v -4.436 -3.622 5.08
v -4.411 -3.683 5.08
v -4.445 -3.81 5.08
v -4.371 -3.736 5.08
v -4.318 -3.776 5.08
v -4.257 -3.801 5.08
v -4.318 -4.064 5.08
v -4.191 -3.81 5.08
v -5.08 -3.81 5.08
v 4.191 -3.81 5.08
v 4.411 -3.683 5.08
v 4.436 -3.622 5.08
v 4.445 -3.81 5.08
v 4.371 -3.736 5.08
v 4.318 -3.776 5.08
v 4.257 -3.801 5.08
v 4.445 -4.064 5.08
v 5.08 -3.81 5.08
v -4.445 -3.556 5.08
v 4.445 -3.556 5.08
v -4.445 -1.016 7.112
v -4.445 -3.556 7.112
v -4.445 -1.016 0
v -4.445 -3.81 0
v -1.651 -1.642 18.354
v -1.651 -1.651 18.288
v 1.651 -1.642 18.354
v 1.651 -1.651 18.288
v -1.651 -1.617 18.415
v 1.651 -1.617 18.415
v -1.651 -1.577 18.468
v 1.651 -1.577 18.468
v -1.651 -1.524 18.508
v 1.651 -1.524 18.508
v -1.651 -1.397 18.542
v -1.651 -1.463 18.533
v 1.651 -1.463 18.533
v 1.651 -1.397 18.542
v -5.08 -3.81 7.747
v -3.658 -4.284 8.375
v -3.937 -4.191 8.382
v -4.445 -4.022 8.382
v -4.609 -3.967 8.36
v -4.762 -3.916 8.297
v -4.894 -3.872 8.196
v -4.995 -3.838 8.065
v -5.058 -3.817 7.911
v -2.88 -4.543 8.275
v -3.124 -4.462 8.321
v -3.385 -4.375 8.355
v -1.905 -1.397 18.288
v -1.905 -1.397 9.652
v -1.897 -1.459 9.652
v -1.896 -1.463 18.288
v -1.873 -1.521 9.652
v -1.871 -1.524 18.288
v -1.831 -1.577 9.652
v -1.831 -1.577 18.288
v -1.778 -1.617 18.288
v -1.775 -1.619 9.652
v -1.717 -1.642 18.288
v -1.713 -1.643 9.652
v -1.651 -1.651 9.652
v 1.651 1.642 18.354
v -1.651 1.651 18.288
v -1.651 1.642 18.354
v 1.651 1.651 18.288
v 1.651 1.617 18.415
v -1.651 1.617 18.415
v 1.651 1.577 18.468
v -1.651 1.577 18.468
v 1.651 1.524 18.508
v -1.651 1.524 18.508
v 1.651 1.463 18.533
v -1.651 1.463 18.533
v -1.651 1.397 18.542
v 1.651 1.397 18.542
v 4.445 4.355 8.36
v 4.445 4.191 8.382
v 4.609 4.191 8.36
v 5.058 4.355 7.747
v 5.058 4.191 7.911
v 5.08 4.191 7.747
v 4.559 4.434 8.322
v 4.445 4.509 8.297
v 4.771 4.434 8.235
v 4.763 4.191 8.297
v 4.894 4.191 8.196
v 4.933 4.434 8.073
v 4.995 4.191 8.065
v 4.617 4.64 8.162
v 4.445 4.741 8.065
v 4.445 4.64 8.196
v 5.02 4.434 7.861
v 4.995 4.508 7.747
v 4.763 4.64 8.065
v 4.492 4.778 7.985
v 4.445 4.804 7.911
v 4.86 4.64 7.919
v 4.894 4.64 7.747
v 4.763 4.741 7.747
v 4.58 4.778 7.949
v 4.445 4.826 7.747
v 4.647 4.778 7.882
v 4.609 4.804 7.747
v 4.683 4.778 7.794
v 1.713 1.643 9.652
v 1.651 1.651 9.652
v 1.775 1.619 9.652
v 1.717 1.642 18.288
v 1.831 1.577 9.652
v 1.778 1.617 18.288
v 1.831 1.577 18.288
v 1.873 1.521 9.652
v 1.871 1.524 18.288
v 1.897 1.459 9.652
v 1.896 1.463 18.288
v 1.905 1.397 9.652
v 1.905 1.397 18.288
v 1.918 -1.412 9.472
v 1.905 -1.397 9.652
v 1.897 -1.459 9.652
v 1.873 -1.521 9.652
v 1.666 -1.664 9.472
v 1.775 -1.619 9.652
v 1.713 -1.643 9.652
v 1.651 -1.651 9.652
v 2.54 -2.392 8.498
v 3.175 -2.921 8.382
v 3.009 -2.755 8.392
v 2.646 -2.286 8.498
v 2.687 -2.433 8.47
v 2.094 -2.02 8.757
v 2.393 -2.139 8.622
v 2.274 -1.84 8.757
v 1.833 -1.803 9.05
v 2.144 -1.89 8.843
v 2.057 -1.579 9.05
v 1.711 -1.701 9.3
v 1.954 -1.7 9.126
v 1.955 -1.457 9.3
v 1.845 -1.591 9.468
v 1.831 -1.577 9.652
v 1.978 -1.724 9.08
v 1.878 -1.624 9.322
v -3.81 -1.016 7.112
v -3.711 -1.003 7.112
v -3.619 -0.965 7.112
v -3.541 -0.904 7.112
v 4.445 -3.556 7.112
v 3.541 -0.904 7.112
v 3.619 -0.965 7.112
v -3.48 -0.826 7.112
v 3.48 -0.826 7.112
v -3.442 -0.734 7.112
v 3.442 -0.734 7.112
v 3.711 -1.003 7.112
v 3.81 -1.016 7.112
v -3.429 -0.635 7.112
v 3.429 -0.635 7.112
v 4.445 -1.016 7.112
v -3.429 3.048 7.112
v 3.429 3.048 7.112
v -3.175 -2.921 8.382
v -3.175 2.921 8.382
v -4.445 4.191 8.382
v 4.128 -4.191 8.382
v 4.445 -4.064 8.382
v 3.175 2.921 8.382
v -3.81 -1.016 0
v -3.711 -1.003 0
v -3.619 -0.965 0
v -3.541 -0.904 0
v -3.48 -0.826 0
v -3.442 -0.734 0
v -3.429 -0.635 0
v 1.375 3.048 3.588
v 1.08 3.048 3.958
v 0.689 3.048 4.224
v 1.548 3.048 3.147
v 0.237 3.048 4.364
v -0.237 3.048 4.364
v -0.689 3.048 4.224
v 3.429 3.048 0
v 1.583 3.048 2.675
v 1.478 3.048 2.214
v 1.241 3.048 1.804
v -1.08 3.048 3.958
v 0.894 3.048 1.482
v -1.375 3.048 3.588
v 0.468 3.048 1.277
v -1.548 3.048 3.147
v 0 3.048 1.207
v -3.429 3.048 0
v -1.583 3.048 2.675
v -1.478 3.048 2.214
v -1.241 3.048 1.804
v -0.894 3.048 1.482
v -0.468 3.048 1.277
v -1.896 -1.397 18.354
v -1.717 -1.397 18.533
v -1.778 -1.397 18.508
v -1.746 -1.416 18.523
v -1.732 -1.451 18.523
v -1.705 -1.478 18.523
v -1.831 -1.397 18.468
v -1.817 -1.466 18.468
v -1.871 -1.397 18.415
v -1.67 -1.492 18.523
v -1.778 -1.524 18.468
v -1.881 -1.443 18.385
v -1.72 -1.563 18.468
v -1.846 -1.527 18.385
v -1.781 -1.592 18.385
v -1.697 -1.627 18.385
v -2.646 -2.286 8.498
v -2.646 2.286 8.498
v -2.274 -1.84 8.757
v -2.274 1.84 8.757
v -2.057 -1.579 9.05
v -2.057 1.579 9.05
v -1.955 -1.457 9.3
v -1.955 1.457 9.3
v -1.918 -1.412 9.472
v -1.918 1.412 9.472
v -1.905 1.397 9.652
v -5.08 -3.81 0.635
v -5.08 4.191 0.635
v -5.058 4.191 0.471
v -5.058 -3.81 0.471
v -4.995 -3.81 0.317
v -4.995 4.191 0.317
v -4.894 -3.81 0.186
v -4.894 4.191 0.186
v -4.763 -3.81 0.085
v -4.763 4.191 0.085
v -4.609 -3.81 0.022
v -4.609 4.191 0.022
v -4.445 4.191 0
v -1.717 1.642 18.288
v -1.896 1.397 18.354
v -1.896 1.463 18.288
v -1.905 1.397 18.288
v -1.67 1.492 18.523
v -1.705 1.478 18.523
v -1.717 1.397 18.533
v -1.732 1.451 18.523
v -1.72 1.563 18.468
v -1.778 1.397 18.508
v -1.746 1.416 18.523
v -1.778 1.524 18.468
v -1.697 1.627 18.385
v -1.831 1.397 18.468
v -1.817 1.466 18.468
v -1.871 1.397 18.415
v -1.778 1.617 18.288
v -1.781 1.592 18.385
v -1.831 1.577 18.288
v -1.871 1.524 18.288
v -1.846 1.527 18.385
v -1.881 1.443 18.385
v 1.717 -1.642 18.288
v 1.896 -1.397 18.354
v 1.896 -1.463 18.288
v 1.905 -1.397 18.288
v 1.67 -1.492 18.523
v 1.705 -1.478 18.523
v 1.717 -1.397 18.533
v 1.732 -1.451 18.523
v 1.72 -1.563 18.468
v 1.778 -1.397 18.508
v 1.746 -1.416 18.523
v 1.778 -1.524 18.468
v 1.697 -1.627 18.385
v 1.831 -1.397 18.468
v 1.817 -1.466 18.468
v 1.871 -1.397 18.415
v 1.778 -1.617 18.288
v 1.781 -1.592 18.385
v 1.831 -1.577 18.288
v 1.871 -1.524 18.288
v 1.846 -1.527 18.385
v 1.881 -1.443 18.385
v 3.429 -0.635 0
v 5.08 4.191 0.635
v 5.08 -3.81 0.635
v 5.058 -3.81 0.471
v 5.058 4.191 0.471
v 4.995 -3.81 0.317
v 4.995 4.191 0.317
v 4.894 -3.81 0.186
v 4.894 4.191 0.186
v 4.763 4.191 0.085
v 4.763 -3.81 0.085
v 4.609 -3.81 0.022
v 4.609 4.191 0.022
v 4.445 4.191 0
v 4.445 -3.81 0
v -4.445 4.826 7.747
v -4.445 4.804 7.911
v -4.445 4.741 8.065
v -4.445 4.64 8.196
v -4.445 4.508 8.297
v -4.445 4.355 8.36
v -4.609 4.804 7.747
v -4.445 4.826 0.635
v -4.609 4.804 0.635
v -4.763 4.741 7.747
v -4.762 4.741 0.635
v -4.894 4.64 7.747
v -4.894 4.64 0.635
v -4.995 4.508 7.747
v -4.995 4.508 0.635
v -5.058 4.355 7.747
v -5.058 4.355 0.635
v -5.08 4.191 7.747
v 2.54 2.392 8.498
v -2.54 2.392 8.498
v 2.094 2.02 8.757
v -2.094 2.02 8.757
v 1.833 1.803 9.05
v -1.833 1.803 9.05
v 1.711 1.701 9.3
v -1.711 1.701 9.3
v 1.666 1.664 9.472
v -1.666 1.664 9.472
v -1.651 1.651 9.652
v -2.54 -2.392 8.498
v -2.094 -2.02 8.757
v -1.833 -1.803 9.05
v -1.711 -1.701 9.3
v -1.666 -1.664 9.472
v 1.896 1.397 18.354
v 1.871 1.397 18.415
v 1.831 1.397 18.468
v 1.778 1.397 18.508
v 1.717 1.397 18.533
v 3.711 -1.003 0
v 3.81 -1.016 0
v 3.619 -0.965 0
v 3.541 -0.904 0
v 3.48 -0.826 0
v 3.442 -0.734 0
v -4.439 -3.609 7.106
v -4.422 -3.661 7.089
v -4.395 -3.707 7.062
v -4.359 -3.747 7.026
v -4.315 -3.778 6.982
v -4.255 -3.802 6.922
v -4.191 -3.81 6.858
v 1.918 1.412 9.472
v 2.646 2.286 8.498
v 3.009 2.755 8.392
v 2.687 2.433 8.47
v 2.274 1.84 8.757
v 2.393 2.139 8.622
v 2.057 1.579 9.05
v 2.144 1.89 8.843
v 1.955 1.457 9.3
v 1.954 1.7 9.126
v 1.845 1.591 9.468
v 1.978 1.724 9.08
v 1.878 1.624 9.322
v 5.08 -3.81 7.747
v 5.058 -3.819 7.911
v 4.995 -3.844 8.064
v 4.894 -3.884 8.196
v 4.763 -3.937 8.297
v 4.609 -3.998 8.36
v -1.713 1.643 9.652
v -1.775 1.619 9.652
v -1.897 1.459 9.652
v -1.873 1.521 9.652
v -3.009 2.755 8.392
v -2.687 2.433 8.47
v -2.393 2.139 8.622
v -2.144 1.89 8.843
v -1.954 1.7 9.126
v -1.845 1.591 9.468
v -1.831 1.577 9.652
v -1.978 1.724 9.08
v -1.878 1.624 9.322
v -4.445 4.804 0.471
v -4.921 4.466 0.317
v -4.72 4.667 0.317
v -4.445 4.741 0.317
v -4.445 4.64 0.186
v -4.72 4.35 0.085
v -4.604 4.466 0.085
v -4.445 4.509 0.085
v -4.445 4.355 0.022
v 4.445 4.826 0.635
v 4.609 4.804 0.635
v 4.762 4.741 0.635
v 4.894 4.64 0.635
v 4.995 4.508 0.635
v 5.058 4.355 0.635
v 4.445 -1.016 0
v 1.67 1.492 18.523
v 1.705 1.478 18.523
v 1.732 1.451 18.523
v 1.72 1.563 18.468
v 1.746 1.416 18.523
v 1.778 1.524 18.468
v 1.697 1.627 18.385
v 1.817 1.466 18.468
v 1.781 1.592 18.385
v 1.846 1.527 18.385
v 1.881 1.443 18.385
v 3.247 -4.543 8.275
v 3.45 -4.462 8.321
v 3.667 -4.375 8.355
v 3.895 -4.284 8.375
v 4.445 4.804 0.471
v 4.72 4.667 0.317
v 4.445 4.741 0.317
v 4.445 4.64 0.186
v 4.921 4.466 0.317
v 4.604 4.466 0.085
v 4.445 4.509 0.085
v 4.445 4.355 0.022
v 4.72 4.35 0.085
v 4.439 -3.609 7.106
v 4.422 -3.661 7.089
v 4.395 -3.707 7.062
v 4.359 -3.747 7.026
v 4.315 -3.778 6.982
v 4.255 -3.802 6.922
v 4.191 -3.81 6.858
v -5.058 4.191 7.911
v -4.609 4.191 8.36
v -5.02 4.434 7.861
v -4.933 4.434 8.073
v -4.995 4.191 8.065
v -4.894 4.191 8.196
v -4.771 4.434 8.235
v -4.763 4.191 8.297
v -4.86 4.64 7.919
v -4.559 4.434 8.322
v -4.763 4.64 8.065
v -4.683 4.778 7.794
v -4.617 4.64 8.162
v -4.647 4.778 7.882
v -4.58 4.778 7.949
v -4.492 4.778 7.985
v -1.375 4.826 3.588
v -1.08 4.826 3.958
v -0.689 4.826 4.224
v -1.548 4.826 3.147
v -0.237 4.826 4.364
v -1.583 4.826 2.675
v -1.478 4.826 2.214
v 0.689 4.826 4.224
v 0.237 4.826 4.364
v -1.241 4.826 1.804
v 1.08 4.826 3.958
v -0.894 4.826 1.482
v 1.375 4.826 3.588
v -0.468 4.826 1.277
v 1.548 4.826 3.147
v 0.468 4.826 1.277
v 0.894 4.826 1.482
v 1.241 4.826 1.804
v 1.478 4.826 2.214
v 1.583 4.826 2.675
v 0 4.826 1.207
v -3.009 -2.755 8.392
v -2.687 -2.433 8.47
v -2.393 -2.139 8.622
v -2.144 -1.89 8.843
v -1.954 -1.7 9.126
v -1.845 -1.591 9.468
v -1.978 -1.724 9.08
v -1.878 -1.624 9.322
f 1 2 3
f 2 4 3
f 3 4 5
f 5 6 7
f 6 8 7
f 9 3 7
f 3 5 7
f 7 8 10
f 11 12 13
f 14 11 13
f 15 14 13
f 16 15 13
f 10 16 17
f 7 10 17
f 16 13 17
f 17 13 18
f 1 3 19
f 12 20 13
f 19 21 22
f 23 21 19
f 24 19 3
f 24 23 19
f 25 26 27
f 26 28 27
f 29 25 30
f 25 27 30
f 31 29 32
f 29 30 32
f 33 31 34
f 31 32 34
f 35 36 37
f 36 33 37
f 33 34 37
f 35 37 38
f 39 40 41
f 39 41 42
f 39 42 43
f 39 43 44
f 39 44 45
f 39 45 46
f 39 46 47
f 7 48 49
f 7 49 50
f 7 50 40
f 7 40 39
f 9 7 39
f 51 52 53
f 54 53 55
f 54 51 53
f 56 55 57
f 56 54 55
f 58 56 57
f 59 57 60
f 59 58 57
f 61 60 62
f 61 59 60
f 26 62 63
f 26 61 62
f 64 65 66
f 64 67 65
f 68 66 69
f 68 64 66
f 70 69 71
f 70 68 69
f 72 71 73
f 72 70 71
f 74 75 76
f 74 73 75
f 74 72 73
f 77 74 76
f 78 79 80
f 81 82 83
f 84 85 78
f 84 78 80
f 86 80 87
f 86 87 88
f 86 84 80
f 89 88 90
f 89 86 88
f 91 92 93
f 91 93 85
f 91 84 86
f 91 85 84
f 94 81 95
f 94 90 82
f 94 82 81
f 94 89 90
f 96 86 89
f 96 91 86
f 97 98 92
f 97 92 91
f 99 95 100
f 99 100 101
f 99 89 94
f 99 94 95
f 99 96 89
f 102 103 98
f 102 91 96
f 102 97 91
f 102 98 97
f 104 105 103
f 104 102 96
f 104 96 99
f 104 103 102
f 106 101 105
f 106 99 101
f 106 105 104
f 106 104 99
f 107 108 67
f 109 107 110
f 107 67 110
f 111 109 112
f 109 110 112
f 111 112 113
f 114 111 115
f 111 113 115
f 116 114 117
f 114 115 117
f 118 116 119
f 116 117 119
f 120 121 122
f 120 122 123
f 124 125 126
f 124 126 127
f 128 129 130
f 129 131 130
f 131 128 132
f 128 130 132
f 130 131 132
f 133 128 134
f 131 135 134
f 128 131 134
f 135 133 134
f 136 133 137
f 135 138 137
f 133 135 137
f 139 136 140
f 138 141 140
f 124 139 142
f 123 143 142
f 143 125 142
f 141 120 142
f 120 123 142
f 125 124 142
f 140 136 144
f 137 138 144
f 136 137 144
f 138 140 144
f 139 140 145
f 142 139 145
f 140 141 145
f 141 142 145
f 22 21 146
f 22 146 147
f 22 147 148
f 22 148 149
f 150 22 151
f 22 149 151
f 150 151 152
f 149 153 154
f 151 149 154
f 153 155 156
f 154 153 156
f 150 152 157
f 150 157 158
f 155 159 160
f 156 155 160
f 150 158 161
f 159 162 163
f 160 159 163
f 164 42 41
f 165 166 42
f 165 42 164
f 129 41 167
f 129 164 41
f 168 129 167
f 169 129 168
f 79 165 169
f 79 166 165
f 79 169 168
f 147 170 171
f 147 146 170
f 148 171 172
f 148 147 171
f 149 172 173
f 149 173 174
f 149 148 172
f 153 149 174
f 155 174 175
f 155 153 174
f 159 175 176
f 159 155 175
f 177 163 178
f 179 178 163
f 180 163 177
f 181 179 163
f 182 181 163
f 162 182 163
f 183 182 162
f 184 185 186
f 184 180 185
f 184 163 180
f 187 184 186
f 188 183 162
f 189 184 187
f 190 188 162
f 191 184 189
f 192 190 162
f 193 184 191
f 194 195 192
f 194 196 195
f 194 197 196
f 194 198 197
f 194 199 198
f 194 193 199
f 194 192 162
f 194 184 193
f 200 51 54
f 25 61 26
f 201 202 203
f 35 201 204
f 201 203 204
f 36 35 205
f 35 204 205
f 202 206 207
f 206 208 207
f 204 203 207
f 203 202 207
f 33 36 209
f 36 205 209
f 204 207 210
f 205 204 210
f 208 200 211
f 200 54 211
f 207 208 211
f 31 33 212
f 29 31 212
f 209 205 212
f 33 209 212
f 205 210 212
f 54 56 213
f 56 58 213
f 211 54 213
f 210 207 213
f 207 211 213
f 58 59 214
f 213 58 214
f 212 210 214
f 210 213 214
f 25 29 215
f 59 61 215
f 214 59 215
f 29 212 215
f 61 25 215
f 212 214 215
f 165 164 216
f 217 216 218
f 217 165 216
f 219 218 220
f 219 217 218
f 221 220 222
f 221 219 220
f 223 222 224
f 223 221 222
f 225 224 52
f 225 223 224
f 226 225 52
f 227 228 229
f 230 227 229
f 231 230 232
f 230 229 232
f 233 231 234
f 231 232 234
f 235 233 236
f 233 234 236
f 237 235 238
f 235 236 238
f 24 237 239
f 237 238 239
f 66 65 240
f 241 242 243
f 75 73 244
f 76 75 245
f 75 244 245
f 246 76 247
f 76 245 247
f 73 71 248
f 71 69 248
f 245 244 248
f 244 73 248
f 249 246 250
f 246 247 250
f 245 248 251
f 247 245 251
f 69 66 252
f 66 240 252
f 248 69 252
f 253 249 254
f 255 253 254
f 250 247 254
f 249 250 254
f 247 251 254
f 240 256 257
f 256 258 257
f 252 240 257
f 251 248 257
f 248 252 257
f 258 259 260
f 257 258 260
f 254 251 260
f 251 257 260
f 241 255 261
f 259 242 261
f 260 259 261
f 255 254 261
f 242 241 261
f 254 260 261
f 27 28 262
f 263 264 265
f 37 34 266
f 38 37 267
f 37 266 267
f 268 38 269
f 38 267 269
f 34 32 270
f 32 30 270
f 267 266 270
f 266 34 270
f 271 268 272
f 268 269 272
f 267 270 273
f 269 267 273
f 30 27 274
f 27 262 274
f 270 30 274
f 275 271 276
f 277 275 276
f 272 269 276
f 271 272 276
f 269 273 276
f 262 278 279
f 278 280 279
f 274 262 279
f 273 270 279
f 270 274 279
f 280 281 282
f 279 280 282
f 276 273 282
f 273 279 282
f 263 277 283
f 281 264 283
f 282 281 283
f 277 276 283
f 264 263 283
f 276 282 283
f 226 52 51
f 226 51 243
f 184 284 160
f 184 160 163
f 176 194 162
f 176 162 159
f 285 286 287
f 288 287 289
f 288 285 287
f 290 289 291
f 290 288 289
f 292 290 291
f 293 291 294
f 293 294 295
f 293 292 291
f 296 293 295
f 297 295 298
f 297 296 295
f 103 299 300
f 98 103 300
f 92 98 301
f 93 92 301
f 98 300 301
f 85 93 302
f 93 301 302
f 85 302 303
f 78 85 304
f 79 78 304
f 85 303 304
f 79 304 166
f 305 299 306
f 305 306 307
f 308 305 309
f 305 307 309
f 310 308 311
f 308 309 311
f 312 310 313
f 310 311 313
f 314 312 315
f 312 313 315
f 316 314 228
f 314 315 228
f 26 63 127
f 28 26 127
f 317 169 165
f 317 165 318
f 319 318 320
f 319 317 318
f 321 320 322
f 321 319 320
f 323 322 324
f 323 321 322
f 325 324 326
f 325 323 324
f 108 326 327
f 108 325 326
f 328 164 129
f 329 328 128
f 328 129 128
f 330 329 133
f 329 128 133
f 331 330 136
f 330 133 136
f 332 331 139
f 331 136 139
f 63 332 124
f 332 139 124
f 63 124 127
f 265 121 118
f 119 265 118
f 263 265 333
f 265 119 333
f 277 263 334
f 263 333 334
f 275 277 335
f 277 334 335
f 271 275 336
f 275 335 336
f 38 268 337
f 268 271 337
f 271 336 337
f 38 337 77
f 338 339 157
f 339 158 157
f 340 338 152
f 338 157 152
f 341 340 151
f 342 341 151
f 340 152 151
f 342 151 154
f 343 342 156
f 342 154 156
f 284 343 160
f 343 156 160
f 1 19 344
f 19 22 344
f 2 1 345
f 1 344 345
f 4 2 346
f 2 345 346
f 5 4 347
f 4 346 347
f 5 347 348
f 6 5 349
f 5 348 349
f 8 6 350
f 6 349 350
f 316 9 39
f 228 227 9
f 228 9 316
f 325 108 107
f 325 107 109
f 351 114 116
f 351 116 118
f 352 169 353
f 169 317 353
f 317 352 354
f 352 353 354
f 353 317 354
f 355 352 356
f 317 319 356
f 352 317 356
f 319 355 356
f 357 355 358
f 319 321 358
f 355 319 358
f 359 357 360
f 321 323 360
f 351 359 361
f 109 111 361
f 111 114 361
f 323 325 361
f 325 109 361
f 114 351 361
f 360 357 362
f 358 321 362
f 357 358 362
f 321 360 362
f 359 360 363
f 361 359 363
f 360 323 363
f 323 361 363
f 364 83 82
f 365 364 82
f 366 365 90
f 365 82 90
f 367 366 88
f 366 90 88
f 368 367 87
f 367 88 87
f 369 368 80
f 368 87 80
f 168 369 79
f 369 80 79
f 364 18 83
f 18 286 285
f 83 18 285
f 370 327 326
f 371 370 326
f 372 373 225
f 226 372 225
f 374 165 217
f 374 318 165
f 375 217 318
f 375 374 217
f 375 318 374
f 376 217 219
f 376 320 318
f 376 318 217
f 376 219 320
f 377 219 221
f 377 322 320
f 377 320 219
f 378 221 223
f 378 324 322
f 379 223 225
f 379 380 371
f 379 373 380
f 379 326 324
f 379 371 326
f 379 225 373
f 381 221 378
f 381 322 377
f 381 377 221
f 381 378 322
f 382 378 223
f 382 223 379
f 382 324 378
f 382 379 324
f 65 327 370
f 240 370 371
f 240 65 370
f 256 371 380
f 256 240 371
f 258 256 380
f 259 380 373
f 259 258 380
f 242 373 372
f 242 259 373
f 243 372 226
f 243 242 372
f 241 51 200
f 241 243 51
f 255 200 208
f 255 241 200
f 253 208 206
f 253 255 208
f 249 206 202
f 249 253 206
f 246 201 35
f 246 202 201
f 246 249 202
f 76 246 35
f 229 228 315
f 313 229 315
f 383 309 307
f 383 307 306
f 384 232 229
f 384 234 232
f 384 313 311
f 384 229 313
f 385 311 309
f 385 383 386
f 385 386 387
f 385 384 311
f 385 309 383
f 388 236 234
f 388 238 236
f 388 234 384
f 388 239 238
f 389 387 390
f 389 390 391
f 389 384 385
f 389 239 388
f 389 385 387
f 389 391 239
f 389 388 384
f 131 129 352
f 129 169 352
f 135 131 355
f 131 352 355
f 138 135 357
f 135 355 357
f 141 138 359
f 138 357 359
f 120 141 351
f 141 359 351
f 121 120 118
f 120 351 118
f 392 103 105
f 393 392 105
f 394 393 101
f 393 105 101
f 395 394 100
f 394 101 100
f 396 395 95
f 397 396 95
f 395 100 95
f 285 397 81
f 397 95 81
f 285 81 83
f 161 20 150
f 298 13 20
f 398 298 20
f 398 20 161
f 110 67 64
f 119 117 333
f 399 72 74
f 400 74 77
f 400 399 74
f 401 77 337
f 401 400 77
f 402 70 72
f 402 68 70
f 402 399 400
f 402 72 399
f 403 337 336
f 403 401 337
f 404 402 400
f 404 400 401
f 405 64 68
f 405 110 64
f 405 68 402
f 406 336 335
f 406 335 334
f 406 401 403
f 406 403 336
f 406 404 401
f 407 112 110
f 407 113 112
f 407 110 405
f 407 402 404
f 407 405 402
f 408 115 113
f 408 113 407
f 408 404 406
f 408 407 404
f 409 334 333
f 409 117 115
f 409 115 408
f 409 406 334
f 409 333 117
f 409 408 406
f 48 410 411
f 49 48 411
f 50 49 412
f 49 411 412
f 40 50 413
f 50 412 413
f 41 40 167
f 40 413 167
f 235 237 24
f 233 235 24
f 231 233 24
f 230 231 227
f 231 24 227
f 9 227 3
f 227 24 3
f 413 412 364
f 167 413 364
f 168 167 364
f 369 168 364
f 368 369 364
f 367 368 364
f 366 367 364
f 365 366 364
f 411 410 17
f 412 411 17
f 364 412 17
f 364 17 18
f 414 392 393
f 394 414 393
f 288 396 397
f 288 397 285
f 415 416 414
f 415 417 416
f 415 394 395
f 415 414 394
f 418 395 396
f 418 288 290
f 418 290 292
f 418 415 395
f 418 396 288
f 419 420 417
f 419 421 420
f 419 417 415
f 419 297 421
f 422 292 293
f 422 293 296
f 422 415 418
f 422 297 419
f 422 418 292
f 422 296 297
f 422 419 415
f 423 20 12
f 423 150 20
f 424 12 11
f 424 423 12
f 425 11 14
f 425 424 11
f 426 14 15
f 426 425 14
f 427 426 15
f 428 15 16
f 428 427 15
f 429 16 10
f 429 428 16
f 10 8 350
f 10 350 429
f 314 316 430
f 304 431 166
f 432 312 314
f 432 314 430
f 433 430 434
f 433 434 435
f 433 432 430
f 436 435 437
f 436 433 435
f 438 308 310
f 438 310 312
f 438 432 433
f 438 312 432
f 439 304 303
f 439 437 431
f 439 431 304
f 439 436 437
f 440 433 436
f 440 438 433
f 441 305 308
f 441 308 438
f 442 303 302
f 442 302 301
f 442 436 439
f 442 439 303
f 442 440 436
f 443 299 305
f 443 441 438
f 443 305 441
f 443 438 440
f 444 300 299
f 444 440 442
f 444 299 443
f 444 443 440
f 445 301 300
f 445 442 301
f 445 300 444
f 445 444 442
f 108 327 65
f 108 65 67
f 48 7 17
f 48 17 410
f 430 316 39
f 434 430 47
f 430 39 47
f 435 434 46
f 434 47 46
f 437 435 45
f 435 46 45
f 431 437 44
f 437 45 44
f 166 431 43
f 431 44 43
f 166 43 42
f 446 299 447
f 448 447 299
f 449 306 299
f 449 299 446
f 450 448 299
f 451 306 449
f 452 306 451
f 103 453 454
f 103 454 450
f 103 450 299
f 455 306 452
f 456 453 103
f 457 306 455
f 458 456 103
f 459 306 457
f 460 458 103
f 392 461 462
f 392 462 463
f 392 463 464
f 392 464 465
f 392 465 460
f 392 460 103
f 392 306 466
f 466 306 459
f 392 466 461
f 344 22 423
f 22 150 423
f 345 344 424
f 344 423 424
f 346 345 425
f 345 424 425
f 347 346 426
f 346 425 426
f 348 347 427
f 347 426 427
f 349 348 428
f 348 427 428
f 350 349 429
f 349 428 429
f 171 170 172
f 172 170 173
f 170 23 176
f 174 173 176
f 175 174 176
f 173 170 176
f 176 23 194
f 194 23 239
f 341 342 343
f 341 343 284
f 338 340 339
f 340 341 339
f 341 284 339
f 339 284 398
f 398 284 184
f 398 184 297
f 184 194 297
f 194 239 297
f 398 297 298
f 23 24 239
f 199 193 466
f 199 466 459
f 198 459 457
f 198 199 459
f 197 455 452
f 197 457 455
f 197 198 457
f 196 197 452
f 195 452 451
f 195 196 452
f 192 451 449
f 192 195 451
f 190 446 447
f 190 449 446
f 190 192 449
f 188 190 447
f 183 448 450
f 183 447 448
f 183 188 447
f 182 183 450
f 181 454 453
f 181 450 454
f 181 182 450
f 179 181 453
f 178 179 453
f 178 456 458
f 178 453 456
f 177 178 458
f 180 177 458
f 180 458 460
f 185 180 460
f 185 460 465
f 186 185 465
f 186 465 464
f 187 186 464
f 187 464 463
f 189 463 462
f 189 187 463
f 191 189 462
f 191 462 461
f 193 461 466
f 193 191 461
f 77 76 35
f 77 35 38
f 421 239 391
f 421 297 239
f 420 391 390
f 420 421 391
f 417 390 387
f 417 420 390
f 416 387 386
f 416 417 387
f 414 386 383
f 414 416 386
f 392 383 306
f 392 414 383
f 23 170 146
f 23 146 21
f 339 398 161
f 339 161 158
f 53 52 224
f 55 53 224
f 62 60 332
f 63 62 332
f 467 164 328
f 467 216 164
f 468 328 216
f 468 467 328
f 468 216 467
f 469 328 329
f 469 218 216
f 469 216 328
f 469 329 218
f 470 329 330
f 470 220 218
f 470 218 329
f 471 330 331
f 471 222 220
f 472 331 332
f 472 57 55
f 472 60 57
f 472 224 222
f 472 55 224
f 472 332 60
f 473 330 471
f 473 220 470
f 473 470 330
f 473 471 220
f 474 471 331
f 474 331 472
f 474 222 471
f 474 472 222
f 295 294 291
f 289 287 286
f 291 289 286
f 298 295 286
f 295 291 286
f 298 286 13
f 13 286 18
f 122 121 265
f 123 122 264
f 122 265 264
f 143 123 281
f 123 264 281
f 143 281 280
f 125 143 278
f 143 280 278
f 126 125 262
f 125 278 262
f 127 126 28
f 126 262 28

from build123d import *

# Parameters (mm, degrees)
SKETCH1_W               = 10.16
SKETCH1_H               = 9.652
BOSS_EXTRUDE1_DEPTH     = 7.112
CUT_EXTRUDE1_DEPTH      = 14.021061708
CUT_EXTRUDE1_DEPTH_BACK = 14.021061708
SKETCH2_R               = 1.5875
SKETCH7_W               = 10.16
SKETCH7_H               = 9.652
BOSS_EXTRUDE3_DEPTH     = 1.27
FILLET1_R               = 0.635
FILLET3_R               = 0.635
FILLET4_R               = 0.381
CUT_EXTRUDE3_DEPTH      = 14.574749537
CUT_EXTRUDE3_DEPTH_BACK = 14.574749537
FILLET9_R               = 0.254
CUT_EXTRUDE7_DEPTH      = 9.654656319
SKETCH14_W              = 3.81
SKETCH14_H              = 3.302
BOSS_EXTRUDE4_DEPTH     = 10.16
FILLET14_R              = 1.27
FILLET15_R              = 0.254


# Some blends are built 0.0001 mm under size
with BuildPart() as part:
    # Sketch1 → Boss-Extrude1 (new body)
    with BuildSketch(Plane.XY):
        Rectangle(SKETCH1_W, SKETCH1_H)
        Polygon((-4.445, -3.81), (4.445, -3.81), (4.445, -1.016), (3.429, -1.016), (3.429, 3.048), (-3.429, 3.048), (-3.429, -1.016), (-4.445, -1.016), align=None, mode=Mode.SUBTRACT)
    extrude(amount=BOSS_EXTRUDE1_DEPTH)

    # Sketch2 → Cut-Extrude1 (cut, two sides: drawn at the far end of the back side and taken through both)
    with BuildSketch(Plane(origin=(0, 4.826, 0), x_dir=(1, 0, 0), z_dir=(0, 1, 0)).offset(-CUT_EXTRUDE1_DEPTH_BACK)):
        with Locations(Location((0, -2.794, 0), (0, 0, 90))):
            Circle(SKETCH2_R)
    extrude(amount=CUT_EXTRUDE1_DEPTH + CUT_EXTRUDE1_DEPTH_BACK, mode=Mode.SUBTRACT)

    # Sketch7 → Boss-Extrude3 (add)
    with BuildSketch(Plane.XY.offset(7.112)):
        Rectangle(SKETCH7_W, SKETCH7_H)
    extrude(amount=BOSS_EXTRUDE3_DEPTH)

    # Fillet1
    fillet1_edges = [part.edges().sort_by_distance(p)[0] for p in [
        (-5.08, 0, 0),
        (0, 4.826, 0),
        (5.08, 0, 0),
    ]]
    fillet(fillet1_edges, radius=FILLET1_R - 0.0001)  # a hair under: the kernel refuses the full size

    # Fillet3
    # the kernel refuses this fillet: 0.635 mm, written as the material it takes off along each edge
    with BuildSketch(Plane(origin=(4.445, 4.191, 0), x_dir=(0, 1, 0), z_dir=(-1, 0, 0))) as fillet3_piece_1:
        with BuildLine():
            CenterArc((0.0001, -0.6349), 0.6349, 0, 90)
            Line((0.635, -0.6349), (0.635, 0))
            Line((0.635, 0), (0.0001, 0))
        make_face()
    revolve(axis=Axis((4.445, 4.191, 0), (0, 0, -1)), revolution_arc=90, mode=Mode.SUBTRACT)
    with BuildSketch(Plane(origin=(-4.445, 4.191, 0), x_dir=(-1, 0, 0), z_dir=(0, -1, 0))) as fillet3_piece_2:
        with BuildLine():
            CenterArc((0.0001, -0.6349), 0.6349, 0, 90)
            Line((0.635, -0.6349), (0.635, 0))
            Line((0.635, 0), (0.0001, 0))
        make_face()
    revolve(axis=Axis((-4.445, 4.191, 0), (0, 0, -1)), revolution_arc=90, mode=Mode.SUBTRACT)
    with BuildSketch(Plane(origin=(-4.445, -4.191, 7.747), x_dir=(0, 0, 1), z_dir=(-1, 0, 0))) as fillet3_piece_3_section:
        Polygon((0, 0), (FILLET3_R * 1.02, 0), (FILLET3_R * 1.02, -FILLET3_R * 1.02), (0, -FILLET3_R * 1.02), align=None)
    fillet3_piece_3 = extrude(amount=FILLET3_R * 1.02, mode=Mode.PRIVATE)
    fillet3_piece_3 = fillet3_piece_3 - Plane(origin=(-4.445, -4.191, 7.747), x_dir=(0, 0.7071067811865475, -0.7071067811865475), z_dir=(-1, 0, 0)) * Sphere(FILLET3_R, mode=Mode.PRIVATE)
    add(fillet3_piece_3, mode=Mode.SUBTRACT)
    with BuildSketch(Plane(origin=(-4.445, 4.191, 7.747), x_dir=(-1, 0, 0), z_dir=(0, 1, 0))) as fillet3_piece_4_section:
        Polygon((0, 0), (FILLET3_R * 1.02, 0), (FILLET3_R * 1.02, FILLET3_R * 1.02), (0, FILLET3_R * 1.02), align=None)
    fillet3_piece_4 = extrude(amount=FILLET3_R * 1.02, mode=Mode.PRIVATE)
    fillet3_piece_4 = fillet3_piece_4 - Plane(origin=(-4.445, 4.191, 7.747), x_dir=(0.7071067811865475, 0, -0.7071067811865475), z_dir=(0, 1, 0)) * Sphere(FILLET3_R, mode=Mode.PRIVATE)
    add(fillet3_piece_4, mode=Mode.SUBTRACT)
    with BuildSketch(Plane(origin=(4.445, -4.191, 7.747), x_dir=(1, 0, 0), z_dir=(0, 0, 1))) as fillet3_piece_5_section:
        Polygon((0, 0), (FILLET3_R * 1.02, 0), (FILLET3_R * 1.02, -FILLET3_R * 1.02), (0, -FILLET3_R * 1.02), align=None)
    fillet3_piece_5 = extrude(amount=FILLET3_R * 1.02, mode=Mode.PRIVATE)
    fillet3_piece_5 = fillet3_piece_5 - Plane(origin=(4.445, -4.191, 7.747), x_dir=(-0.7071067811865476, 0.7071067811865475, 0), z_dir=(0, 0, 1)) * Sphere(FILLET3_R, mode=Mode.PRIVATE)
    add(fillet3_piece_5, mode=Mode.SUBTRACT)
    with BuildSketch(Plane(origin=(4.445, 4.191, 7.747), x_dir=(0, 0, 1), z_dir=(0, 1, 0))) as fillet3_piece_6_section:
        Polygon((0, 0), (FILLET3_R * 1.02, 0), (FILLET3_R * 1.02, FILLET3_R * 1.02), (0, FILLET3_R * 1.02), align=None)
    fillet3_piece_6 = extrude(amount=FILLET3_R * 1.02, mode=Mode.PRIVATE)
    fillet3_piece_6 = fillet3_piece_6 - Plane(origin=(4.445, 4.191, 7.747), x_dir=(-0.7071067811865475, 0, -0.7071067811865475), z_dir=(0, 1, 0)) * Sphere(FILLET3_R, mode=Mode.PRIVATE)
    add(fillet3_piece_6, mode=Mode.SUBTRACT)
    with BuildSketch(Plane(origin=(-5.08, -4.191, 8.382), x_dir=(0, 0, -1), z_dir=(0, 1, 0))) as fillet3_piece_7:
        with BuildLine():
            CenterArc((FILLET3_R, -FILLET3_R), FILLET3_R, 90, 90)
            Line((0, -FILLET3_R), (-FILLET3_R * 0.02, -FILLET3_R))
            Line((-FILLET3_R * 0.02, -FILLET3_R), (-FILLET3_R * 0.02, FILLET3_R * 0.02))
            Line((-FILLET3_R * 0.02, FILLET3_R * 0.02), (FILLET3_R, FILLET3_R * 0.02))
            Line((FILLET3_R, FILLET3_R * 0.02), (FILLET3_R, 0))
        make_face()
    extrude(amount=8.382, mode=Mode.SUBTRACT)
    with BuildSketch(Plane(origin=(4.445, -4.826, 8.382), x_dir=(0, 1, 0), z_dir=(-1, 0, 0))) as fillet3_piece_8:
        with BuildLine():
            CenterArc((FILLET3_R, FILLET3_R), FILLET3_R, 180, 90)
            Line((0, FILLET3_R), (-FILLET3_R * 0.02, FILLET3_R))
            Line((-FILLET3_R * 0.02, FILLET3_R), (-FILLET3_R * 0.02, -FILLET3_R * 0.02))
            Line((-FILLET3_R * 0.02, -FILLET3_R * 0.02), (FILLET3_R, -FILLET3_R * 0.02))
            Line((FILLET3_R, -FILLET3_R * 0.02), (FILLET3_R, 0))
        make_face()
    extrude(amount=8.89, mode=Mode.SUBTRACT)
    with BuildSketch(Plane(origin=(5.08, 4.191, 8.382), x_dir=(-1, 0, 0), z_dir=(0, -1, 0))) as fillet3_piece_9:
        with BuildLine():
            CenterArc((FILLET3_R, FILLET3_R), FILLET3_R, 180, 90)
            Line((0, FILLET3_R), (-FILLET3_R * 0.02, FILLET3_R))
            Line((-FILLET3_R * 0.02, FILLET3_R), (-FILLET3_R * 0.02, -FILLET3_R * 0.02))
            Line((-FILLET3_R * 0.02, -FILLET3_R * 0.02), (FILLET3_R, -FILLET3_R * 0.02))
            Line((FILLET3_R, -FILLET3_R * 0.02), (FILLET3_R, 0))
        make_face()
    extrude(amount=8.382, mode=Mode.SUBTRACT)
    with BuildSketch(Plane(origin=(-4.445, 4.826, 8.382), x_dir=(0, 0, -1), z_dir=(1, 0, 0))) as fillet3_piece_10:
        with BuildLine():
            CenterArc((FILLET3_R, -FILLET3_R), FILLET3_R, 90, 90)
            Line((0, -FILLET3_R), (-FILLET3_R * 0.02, -FILLET3_R))
            Line((-FILLET3_R * 0.02, -FILLET3_R), (-FILLET3_R * 0.02, FILLET3_R * 0.02))
            Line((-FILLET3_R * 0.02, FILLET3_R * 0.02), (FILLET3_R, FILLET3_R * 0.02))
            Line((FILLET3_R, FILLET3_R * 0.02), (FILLET3_R, 0))
        make_face()
    extrude(amount=8.89, mode=Mode.SUBTRACT)
    with BuildSketch(Plane(origin=(6.0326, -4.826, 0), x_dir=(0, 0, 1), z_dir=(-1, 0, 0))) as fillet3_piece_11:
        with BuildLine():
            CenterArc((FILLET3_R, FILLET3_R), FILLET3_R, 180, 90)
            Line((0, FILLET3_R), (-FILLET3_R * 0.02, FILLET3_R))
            Line((-FILLET3_R * 0.02, FILLET3_R), (-FILLET3_R * 0.02, -FILLET3_R * 0.02))
            Line((-FILLET3_R * 0.02, -FILLET3_R * 0.02), (FILLET3_R, -FILLET3_R * 0.02))
            Line((FILLET3_R, -FILLET3_R * 0.02), (FILLET3_R, 0))
        make_face()
    extrude(amount=12.0652, mode=Mode.SUBTRACT)
    with BuildSketch(Plane(origin=(4.4451, -4.826, 0.6349), x_dir=(0, 0, -1), z_dir=(-1, 0, 0))) as fillet3_piece_12:
        with BuildLine():
            CenterArc((-0.0001, -0.635), FILLET3_R, 0, 89.990977043)
            Line((0.6349, -0.635), (0.6476, -0.635))
            Line((0.6476, -0.635), (0.6476, 0.0127))
            Line((0.6476, 0.0127), (0, 0.0127))
            Line((0, 0.0127), (0, -8e-09))
        make_face()
    revolve(axis=Axis((4.4451, -4.826, 0.6349), (0, -1, 0)), revolution_arc=90, mode=Mode.SUBTRACT)
    with BuildSketch(Plane(origin=(-4.4451, -4.826, 0.6349), x_dir=(0, 0, -1), z_dir=(1, 0, 0))) as fillet3_piece_13:
        with BuildLine():
            CenterArc((-0.0001, 0.635), FILLET3_R, 270.009022957, 89.990977043)
            Line((0.6349, 0.635), (0.6476, 0.635))
            Line((0.6476, 0.635), (0.6476, -0.0127))
            Line((0.6476, -0.0127), (0, -0.0127))
            Line((0, -0.0127), (0, 8e-09))
        make_face()
    revolve(axis=Axis((-4.4451, -4.826, 0.6349), (0, 1, 0)), revolution_arc=90, mode=Mode.SUBTRACT)
    with BuildSketch(Plane(origin=(5.08, -4.826, 7.747), x_dir=(0, 1, 0), z_dir=(0, 0, -1)), Plane(origin=(-5.08, -4.826, -0.9526), x_dir=(0, 1, 0), z_dir=(0, 0, 1))) as fillet3_piece_14:
        with BuildLine():
            CenterArc((FILLET3_R, -FILLET3_R), FILLET3_R, 90, 90)
            Line((0, -FILLET3_R), (-FILLET3_R * 0.02, -FILLET3_R))
            Line((-FILLET3_R * 0.02, -FILLET3_R), (-FILLET3_R * 0.02, FILLET3_R * 0.02))
            Line((-FILLET3_R * 0.02, FILLET3_R * 0.02), (FILLET3_R, FILLET3_R * 0.02))
            Line((FILLET3_R, FILLET3_R * 0.02), (FILLET3_R, 0))
        make_face()
    extrude(amount=8.6996, mode=Mode.SUBTRACT)
    with BuildSketch(Plane(origin=(-5.08, 4.826, 0), x_dir=(1, 0, 0), z_dir=(0, 0, 1)), Plane(origin=(5.08, 4.826, 7.747), x_dir=(-1, 0, 0), z_dir=(0, 0, -1))) as fillet3_piece_15:
        with BuildLine():
            CenterArc((FILLET3_R, -FILLET3_R), FILLET3_R, 90, 90)
            Line((0, -FILLET3_R), (-FILLET3_R * 0.02, -FILLET3_R))
            Line((-FILLET3_R * 0.02, -FILLET3_R), (-FILLET3_R * 0.02, FILLET3_R * 0.02))
            Line((-FILLET3_R * 0.02, FILLET3_R * 0.02), (FILLET3_R, FILLET3_R * 0.02))
            Line((FILLET3_R, FILLET3_R * 0.02), (FILLET3_R, 0))
        make_face()
    extrude(amount=7.747, mode=Mode.SUBTRACT)

    # Fillet4
    fillet4_edges = [part.edges().sort_by_distance(p)[0] for p in [
        (3.429, -1.016, 3.556),
        (-3.429, -1.016, 3.556),
    ]]
    fillet(fillet4_edges, radius=FILLET4_R)

    # Sketch11 → Cut-Extrude3 (cut, two sides: drawn at the far end of the back side and taken through both)
    with BuildSketch(Plane.ZY.offset(-4.445).offset(-CUT_EXTRUDE3_DEPTH_BACK)):
        Polygon((0, -3.81), (5.08, -3.81), (5.08, -4.064), (10.16, -4.826), (0, -4.826), align=None)
    extrude(amount=CUT_EXTRUDE3_DEPTH + CUT_EXTRUDE3_DEPTH_BACK, mode=Mode.SUBTRACT)

    # Fillet9
    fillet9_edges = [part.edges().sort_by_distance(p)[0] for p in [
        (-4.445, -3.81, 6.096),
        (4.445, -3.81, 6.096),
        (0, -3.81, 7.112),
    ]]
    fillet(fillet9_edges, radius=FILLET9_R)

    # Sketch13 → Cut-Extrude7 (cut, through all)
    with BuildSketch(Plane(origin=(0, 0, 5.08), x_dir=(-1, 0, 0), z_dir=(0, 0, -1))):
        Polygon((-5.08, -3.81), (-5.08, -4.826), (-2.54, -4.826), align=None)
        Polygon((5.08, -3.81), (5.08, -4.826), (2.032, -4.826), align=None)
    extrude(amount=-CUT_EXTRUDE7_DEPTH, mode=Mode.SUBTRACT)

    # Sketch14 → Boss-Extrude4 (add)
    with BuildSketch(Plane.XY.offset(8.382)):
        Rectangle(SKETCH14_W, SKETCH14_H)
    extrude(amount=BOSS_EXTRUDE4_DEPTH)

    # Fillet14
    fillet14_edges = [part.edges().sort_by_distance(p)[0] for p in [
        (0, 1.651, 8.382),
        (-1.905, 0, 8.382),
        (0, -1.651, 8.382),
        (1.905, 0, 8.382),
    ]]
    fillet(fillet14_edges, radius=FILLET14_R)

    # Fillet15
    fillet15_edges = [part.edges().sort_by_distance(p)[0] for p in [
        (1.905, 1.651, 14.097),
        (-1.905, 1.651, 14.097),
        (-1.905, -1.651, 14.097),
        (1.905, -1.651, 14.097),
        (0, 1.651, 18.542),
        (-1.905, 0, 18.542),
        (0, -1.651, 18.542),
        (1.905, 0, 18.542),
        (2.354517888, 2.100517888, 8.682614059),
        (2.354517888, -2.100517888, 8.682614059),
        (-2.354517888, 2.100517888, 8.682614059),
        (-2.354517888, -2.100517888, 8.682614059),
    ]]
    fillet(fillet15_edges, radius=FILLET15_R)


solid = part.part
